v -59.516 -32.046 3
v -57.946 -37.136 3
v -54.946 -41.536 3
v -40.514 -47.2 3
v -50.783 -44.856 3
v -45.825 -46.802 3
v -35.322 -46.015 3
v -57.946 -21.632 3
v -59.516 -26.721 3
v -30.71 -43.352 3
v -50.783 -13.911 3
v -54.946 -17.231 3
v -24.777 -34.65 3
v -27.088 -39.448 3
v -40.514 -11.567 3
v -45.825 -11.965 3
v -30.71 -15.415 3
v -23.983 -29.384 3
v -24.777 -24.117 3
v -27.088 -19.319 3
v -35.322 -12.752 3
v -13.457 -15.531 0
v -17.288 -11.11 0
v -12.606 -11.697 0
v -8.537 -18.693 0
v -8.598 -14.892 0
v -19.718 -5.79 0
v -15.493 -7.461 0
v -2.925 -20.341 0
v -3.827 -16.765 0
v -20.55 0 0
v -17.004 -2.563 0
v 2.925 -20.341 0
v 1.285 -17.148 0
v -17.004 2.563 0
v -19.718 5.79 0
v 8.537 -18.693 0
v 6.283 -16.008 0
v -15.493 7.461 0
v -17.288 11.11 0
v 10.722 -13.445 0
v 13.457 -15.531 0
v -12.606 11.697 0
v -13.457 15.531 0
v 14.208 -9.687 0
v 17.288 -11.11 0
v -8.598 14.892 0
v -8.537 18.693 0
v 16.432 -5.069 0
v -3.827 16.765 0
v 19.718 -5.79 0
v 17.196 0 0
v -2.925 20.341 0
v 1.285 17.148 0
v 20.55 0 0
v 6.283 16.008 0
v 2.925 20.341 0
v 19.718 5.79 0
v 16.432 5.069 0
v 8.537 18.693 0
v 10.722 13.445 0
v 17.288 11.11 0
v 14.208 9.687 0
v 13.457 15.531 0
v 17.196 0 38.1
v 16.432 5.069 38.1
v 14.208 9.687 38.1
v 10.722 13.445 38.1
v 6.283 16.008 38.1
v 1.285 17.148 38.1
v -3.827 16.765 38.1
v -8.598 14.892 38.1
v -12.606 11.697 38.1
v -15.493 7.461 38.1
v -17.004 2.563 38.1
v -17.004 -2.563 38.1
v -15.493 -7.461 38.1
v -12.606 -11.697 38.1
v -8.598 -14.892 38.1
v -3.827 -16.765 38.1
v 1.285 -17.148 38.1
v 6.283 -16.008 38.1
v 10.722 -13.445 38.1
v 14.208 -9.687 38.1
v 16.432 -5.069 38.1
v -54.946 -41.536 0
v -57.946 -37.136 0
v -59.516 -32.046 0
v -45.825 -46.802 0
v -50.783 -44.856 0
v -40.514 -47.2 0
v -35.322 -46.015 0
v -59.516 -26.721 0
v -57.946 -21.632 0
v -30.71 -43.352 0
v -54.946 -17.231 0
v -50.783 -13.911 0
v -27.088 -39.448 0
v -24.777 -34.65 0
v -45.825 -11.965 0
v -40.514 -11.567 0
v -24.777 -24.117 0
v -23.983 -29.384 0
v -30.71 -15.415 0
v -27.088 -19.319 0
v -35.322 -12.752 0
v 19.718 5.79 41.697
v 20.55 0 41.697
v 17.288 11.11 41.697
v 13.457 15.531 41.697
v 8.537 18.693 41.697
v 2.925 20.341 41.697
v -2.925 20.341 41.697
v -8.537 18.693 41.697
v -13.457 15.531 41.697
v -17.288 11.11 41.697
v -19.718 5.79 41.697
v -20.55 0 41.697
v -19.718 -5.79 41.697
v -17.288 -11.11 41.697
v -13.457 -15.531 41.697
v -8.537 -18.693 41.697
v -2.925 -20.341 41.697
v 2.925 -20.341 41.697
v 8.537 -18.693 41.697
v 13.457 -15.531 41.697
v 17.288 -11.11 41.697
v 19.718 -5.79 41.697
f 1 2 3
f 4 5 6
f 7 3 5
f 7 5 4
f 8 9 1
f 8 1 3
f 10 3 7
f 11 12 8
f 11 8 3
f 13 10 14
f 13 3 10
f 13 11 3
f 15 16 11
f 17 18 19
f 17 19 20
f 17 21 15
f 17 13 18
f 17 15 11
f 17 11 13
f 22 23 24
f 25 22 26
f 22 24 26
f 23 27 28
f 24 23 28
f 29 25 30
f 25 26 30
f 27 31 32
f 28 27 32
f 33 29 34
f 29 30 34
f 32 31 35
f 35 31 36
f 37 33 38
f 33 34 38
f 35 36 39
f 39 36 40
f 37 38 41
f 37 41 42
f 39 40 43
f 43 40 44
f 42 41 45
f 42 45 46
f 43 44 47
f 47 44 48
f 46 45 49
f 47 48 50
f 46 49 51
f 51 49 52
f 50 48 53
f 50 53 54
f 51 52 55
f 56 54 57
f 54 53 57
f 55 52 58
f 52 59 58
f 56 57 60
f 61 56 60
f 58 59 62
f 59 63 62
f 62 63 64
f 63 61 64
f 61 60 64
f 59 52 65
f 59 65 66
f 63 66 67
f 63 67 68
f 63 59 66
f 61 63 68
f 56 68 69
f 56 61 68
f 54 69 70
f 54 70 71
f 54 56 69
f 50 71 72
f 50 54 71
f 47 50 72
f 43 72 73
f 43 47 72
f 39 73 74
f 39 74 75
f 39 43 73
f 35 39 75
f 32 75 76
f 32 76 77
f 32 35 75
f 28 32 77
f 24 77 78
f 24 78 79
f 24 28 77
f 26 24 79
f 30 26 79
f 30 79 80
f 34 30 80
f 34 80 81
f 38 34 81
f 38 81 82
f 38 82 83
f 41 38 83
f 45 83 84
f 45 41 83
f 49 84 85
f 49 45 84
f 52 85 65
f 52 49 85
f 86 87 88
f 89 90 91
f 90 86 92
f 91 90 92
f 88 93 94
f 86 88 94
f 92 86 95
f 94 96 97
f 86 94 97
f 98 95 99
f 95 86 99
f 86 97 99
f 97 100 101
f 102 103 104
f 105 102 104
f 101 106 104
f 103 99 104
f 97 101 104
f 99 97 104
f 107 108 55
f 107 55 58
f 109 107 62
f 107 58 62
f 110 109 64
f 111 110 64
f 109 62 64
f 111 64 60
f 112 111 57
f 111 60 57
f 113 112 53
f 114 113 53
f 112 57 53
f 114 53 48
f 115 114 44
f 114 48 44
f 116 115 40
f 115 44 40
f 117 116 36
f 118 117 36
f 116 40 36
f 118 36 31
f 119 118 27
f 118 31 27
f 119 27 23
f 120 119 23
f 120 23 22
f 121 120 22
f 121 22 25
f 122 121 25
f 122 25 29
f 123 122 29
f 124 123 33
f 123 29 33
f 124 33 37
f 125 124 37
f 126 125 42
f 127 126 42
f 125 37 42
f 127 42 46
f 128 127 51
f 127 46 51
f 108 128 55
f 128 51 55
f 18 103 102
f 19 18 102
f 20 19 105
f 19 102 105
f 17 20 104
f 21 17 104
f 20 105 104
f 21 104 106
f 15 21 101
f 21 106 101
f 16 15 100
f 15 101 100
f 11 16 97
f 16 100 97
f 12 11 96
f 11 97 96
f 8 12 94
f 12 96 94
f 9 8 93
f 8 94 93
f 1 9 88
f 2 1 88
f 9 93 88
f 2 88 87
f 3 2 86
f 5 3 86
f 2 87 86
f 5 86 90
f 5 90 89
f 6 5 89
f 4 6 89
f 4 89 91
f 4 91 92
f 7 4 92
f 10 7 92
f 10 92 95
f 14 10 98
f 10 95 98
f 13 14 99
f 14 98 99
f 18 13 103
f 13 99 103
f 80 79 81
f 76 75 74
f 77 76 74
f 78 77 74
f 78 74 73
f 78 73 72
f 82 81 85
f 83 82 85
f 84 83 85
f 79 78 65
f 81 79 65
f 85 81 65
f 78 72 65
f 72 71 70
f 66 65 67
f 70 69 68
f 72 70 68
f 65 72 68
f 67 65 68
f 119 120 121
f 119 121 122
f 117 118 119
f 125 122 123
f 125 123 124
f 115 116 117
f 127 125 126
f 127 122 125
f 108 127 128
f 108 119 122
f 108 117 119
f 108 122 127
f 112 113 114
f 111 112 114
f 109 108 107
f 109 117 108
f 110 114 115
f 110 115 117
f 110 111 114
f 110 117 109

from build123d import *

# Parameters (mm, degrees)
F0_R     = 20.55
F1_DEPTH = 41.6972
F2_R     = 17.196368
F3_DEPTH = 38.1
F4_R     = 17.866324
F5_DEPTH = 3


with BuildPart() as f1:
    # F0 (on Top) → F1 (new body)
    with BuildSketch(Plane.XY):
        Circle(F0_R)
    extrude(amount=F1_DEPTH)

    # F2 (on Top) → F3 (cut)
    with BuildSketch(Plane.XY):
        Circle(F2_R)
    extrude(amount=F3_DEPTH, mode=Mode.SUBTRACT)


with BuildPart() as f5:
    # F4 (on Top) → F5 (new body)
    with BuildSketch(Plane.XY):
        with Locations((-41.849427, -29.383641)):
            Circle(F4_R)
    extrude(amount=F5_DEPTH)


solid = Compound([f1.part, f5.part])
